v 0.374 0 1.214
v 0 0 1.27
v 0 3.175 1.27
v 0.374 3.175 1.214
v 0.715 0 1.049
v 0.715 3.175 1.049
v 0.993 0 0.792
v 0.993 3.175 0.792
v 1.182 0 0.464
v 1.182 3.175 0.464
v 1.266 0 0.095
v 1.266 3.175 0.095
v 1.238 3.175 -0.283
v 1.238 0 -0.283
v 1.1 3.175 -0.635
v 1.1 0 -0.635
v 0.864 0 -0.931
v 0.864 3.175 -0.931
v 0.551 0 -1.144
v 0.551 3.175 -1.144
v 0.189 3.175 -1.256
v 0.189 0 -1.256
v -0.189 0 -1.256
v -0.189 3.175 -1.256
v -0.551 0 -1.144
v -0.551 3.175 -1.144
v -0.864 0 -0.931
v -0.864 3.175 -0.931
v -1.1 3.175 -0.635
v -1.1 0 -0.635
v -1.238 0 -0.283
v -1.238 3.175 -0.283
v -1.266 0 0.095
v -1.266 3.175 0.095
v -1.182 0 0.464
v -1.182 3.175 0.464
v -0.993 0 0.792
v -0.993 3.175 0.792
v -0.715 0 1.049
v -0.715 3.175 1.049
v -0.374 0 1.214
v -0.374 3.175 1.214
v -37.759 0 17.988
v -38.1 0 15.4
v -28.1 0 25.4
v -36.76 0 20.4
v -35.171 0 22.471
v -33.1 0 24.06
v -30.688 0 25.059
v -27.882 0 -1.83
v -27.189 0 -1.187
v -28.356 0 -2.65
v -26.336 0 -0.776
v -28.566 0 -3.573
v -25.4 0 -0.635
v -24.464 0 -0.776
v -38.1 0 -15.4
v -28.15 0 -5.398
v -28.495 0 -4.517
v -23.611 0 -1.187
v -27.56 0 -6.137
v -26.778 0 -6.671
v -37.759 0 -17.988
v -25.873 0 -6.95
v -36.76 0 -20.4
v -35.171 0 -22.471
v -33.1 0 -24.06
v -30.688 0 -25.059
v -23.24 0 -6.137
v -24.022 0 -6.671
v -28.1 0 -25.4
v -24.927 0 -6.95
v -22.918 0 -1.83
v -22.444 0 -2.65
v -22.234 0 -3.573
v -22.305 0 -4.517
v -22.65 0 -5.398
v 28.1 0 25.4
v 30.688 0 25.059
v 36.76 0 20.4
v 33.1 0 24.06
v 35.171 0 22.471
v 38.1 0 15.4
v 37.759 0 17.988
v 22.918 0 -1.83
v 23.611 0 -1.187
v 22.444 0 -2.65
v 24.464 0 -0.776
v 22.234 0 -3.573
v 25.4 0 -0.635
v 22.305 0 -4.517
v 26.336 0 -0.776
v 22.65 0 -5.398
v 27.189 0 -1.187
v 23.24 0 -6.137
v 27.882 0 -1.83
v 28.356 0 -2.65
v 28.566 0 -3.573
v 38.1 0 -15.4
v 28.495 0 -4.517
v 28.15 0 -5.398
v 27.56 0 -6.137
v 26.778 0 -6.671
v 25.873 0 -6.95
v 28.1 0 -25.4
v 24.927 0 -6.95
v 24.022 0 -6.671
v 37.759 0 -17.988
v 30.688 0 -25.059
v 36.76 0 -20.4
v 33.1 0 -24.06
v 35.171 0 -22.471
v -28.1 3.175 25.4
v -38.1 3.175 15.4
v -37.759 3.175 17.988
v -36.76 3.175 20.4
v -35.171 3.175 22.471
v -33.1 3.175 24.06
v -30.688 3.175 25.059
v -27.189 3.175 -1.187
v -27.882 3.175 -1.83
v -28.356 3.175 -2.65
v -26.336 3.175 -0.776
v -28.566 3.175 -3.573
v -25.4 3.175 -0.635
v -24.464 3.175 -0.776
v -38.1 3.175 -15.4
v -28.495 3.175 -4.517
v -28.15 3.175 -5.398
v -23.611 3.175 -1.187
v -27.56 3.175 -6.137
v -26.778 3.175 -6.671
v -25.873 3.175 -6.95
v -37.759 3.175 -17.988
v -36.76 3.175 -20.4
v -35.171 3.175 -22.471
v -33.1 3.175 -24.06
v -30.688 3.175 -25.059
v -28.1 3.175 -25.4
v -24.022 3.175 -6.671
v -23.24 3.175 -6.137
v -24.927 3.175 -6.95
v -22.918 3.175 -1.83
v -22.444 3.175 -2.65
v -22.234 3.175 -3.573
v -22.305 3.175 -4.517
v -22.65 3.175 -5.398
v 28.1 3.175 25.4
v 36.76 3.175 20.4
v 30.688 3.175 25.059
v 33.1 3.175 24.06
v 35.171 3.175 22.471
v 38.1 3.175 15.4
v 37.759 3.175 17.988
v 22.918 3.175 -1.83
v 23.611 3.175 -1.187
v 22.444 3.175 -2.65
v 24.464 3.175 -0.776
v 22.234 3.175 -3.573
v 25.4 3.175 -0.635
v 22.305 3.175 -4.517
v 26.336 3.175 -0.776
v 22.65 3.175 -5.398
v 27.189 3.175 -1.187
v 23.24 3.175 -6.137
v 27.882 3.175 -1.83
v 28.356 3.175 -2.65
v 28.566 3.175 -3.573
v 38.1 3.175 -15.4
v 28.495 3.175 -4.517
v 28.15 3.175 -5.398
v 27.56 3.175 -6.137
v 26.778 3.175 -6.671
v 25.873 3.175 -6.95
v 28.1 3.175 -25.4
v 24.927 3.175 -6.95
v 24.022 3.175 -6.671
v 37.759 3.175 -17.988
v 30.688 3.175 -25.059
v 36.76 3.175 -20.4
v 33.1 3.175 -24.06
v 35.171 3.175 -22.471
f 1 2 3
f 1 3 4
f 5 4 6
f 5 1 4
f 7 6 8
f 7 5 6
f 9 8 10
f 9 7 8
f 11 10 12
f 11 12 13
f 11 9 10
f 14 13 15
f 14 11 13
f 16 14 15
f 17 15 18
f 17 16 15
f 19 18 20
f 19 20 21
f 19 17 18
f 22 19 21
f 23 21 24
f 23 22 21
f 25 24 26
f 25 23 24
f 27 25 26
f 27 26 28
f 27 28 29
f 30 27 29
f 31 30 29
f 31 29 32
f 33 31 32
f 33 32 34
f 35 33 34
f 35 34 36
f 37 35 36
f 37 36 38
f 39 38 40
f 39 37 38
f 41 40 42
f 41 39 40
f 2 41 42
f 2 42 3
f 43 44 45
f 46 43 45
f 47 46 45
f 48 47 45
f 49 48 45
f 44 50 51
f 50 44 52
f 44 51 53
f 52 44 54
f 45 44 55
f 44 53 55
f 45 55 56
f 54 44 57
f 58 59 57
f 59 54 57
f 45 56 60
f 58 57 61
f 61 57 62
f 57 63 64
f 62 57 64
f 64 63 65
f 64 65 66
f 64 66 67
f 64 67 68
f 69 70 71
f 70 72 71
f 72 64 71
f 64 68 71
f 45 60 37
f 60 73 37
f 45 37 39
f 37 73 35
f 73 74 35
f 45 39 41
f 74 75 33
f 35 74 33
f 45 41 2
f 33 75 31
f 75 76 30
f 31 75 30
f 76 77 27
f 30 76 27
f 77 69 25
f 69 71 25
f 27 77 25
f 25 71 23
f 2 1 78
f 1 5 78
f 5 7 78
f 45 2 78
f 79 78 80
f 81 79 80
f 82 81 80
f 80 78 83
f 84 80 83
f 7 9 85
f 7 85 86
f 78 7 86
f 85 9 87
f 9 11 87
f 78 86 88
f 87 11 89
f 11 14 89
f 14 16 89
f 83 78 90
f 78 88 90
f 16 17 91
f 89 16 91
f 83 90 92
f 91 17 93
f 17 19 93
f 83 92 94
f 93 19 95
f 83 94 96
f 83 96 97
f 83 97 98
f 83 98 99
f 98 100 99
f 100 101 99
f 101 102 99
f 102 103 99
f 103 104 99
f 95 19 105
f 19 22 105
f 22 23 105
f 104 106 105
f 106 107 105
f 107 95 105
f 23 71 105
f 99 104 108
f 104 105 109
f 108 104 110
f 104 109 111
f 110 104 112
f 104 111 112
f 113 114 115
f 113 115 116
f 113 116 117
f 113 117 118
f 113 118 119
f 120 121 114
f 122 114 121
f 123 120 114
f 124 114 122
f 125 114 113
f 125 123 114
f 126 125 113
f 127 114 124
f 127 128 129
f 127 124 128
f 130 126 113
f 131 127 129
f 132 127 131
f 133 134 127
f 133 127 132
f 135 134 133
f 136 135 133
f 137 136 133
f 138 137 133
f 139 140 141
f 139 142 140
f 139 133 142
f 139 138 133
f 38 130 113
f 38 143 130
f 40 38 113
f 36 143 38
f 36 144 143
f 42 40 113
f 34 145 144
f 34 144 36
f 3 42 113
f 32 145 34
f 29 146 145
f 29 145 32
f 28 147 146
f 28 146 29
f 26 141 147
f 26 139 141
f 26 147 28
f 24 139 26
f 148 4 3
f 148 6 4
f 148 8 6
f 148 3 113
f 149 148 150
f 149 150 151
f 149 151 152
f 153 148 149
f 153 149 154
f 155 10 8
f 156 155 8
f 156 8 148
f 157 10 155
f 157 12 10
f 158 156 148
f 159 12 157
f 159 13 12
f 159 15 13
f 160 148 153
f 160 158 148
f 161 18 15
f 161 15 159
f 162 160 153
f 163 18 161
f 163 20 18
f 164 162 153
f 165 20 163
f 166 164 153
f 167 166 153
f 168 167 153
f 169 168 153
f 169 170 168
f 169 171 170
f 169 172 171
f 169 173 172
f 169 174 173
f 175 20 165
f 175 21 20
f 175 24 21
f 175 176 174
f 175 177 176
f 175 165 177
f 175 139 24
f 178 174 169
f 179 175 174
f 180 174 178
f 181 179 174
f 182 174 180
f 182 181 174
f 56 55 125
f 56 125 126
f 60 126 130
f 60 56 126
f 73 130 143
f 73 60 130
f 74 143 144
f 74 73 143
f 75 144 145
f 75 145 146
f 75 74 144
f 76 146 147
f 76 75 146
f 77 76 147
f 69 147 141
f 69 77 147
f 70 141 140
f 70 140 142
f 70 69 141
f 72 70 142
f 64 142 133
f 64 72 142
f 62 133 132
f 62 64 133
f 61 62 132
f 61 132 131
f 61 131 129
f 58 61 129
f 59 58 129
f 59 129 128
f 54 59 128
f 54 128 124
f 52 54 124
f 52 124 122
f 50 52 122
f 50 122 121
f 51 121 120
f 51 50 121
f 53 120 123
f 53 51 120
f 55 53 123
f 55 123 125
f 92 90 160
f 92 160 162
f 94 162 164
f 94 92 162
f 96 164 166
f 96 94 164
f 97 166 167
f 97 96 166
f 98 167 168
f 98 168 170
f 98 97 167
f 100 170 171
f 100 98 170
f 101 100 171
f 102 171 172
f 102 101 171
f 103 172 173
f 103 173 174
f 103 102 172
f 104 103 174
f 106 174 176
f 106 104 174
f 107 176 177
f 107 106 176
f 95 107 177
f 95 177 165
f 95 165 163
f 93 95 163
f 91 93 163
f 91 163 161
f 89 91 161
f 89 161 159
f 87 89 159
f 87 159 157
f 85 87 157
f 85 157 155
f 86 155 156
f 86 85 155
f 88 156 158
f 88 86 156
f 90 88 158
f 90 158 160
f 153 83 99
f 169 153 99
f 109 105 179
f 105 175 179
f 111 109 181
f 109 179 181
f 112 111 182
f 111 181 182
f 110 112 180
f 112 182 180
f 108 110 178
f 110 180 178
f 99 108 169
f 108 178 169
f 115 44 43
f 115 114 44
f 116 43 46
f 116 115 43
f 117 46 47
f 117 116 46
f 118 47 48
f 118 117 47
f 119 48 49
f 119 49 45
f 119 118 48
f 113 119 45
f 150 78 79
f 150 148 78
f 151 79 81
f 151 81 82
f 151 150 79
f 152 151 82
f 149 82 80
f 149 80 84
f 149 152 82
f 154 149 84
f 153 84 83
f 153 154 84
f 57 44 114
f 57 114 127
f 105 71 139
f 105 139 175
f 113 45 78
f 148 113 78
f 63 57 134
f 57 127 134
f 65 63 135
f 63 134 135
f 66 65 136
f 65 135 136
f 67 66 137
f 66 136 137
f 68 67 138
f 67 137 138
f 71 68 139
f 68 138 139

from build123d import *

# Parameters (mm, degrees)
SKETCH1_W           = 76.2
SKETCH1_H           = 50.8
SKETCH1_R           = 3.175
SKETCH1_R_2         = 1.27
BOSS_EXTRUDE1_DEPTH = 3.175
FILLET1_R           = 10


with BuildPart() as part:
    # Sketch1 → Boss-Extrude1 (new body)
    with BuildSketch(Plane(origin=(0, 0, 0), x_dir=(1, 0, 0), z_dir=(0, 1, 0))):
        Rectangle(SKETCH1_W, SKETCH1_H)
        with Locations(Location((-25.4, 3.81, 0), (0, 0, 270))):
            Circle(SKETCH1_R, mode=Mode.SUBTRACT)
        with Locations(Location((25.4, 3.81, 0), (0, 0, 270))):
            Circle(SKETCH1_R, mode=Mode.SUBTRACT)
        with Locations(Location((0, 0, 0), (0, 0, 270))):
            Circle(SKETCH1_R_2, mode=Mode.SUBTRACT)
    extrude(amount=BOSS_EXTRUDE1_DEPTH)

    # Fillet1
    fillet1_edges = [part.edges().sort_by_distance(p)[0] for p in [
        (38.1, 1.5875, 25.4),
        (-38.1, 1.5875, 25.4),
        (-38.1, 1.5875, -25.4),
        (38.1, 1.5875, -25.4),
    ]]
    fillet(fillet1_edges, radius=FILLET1_R)


solid = part.part
